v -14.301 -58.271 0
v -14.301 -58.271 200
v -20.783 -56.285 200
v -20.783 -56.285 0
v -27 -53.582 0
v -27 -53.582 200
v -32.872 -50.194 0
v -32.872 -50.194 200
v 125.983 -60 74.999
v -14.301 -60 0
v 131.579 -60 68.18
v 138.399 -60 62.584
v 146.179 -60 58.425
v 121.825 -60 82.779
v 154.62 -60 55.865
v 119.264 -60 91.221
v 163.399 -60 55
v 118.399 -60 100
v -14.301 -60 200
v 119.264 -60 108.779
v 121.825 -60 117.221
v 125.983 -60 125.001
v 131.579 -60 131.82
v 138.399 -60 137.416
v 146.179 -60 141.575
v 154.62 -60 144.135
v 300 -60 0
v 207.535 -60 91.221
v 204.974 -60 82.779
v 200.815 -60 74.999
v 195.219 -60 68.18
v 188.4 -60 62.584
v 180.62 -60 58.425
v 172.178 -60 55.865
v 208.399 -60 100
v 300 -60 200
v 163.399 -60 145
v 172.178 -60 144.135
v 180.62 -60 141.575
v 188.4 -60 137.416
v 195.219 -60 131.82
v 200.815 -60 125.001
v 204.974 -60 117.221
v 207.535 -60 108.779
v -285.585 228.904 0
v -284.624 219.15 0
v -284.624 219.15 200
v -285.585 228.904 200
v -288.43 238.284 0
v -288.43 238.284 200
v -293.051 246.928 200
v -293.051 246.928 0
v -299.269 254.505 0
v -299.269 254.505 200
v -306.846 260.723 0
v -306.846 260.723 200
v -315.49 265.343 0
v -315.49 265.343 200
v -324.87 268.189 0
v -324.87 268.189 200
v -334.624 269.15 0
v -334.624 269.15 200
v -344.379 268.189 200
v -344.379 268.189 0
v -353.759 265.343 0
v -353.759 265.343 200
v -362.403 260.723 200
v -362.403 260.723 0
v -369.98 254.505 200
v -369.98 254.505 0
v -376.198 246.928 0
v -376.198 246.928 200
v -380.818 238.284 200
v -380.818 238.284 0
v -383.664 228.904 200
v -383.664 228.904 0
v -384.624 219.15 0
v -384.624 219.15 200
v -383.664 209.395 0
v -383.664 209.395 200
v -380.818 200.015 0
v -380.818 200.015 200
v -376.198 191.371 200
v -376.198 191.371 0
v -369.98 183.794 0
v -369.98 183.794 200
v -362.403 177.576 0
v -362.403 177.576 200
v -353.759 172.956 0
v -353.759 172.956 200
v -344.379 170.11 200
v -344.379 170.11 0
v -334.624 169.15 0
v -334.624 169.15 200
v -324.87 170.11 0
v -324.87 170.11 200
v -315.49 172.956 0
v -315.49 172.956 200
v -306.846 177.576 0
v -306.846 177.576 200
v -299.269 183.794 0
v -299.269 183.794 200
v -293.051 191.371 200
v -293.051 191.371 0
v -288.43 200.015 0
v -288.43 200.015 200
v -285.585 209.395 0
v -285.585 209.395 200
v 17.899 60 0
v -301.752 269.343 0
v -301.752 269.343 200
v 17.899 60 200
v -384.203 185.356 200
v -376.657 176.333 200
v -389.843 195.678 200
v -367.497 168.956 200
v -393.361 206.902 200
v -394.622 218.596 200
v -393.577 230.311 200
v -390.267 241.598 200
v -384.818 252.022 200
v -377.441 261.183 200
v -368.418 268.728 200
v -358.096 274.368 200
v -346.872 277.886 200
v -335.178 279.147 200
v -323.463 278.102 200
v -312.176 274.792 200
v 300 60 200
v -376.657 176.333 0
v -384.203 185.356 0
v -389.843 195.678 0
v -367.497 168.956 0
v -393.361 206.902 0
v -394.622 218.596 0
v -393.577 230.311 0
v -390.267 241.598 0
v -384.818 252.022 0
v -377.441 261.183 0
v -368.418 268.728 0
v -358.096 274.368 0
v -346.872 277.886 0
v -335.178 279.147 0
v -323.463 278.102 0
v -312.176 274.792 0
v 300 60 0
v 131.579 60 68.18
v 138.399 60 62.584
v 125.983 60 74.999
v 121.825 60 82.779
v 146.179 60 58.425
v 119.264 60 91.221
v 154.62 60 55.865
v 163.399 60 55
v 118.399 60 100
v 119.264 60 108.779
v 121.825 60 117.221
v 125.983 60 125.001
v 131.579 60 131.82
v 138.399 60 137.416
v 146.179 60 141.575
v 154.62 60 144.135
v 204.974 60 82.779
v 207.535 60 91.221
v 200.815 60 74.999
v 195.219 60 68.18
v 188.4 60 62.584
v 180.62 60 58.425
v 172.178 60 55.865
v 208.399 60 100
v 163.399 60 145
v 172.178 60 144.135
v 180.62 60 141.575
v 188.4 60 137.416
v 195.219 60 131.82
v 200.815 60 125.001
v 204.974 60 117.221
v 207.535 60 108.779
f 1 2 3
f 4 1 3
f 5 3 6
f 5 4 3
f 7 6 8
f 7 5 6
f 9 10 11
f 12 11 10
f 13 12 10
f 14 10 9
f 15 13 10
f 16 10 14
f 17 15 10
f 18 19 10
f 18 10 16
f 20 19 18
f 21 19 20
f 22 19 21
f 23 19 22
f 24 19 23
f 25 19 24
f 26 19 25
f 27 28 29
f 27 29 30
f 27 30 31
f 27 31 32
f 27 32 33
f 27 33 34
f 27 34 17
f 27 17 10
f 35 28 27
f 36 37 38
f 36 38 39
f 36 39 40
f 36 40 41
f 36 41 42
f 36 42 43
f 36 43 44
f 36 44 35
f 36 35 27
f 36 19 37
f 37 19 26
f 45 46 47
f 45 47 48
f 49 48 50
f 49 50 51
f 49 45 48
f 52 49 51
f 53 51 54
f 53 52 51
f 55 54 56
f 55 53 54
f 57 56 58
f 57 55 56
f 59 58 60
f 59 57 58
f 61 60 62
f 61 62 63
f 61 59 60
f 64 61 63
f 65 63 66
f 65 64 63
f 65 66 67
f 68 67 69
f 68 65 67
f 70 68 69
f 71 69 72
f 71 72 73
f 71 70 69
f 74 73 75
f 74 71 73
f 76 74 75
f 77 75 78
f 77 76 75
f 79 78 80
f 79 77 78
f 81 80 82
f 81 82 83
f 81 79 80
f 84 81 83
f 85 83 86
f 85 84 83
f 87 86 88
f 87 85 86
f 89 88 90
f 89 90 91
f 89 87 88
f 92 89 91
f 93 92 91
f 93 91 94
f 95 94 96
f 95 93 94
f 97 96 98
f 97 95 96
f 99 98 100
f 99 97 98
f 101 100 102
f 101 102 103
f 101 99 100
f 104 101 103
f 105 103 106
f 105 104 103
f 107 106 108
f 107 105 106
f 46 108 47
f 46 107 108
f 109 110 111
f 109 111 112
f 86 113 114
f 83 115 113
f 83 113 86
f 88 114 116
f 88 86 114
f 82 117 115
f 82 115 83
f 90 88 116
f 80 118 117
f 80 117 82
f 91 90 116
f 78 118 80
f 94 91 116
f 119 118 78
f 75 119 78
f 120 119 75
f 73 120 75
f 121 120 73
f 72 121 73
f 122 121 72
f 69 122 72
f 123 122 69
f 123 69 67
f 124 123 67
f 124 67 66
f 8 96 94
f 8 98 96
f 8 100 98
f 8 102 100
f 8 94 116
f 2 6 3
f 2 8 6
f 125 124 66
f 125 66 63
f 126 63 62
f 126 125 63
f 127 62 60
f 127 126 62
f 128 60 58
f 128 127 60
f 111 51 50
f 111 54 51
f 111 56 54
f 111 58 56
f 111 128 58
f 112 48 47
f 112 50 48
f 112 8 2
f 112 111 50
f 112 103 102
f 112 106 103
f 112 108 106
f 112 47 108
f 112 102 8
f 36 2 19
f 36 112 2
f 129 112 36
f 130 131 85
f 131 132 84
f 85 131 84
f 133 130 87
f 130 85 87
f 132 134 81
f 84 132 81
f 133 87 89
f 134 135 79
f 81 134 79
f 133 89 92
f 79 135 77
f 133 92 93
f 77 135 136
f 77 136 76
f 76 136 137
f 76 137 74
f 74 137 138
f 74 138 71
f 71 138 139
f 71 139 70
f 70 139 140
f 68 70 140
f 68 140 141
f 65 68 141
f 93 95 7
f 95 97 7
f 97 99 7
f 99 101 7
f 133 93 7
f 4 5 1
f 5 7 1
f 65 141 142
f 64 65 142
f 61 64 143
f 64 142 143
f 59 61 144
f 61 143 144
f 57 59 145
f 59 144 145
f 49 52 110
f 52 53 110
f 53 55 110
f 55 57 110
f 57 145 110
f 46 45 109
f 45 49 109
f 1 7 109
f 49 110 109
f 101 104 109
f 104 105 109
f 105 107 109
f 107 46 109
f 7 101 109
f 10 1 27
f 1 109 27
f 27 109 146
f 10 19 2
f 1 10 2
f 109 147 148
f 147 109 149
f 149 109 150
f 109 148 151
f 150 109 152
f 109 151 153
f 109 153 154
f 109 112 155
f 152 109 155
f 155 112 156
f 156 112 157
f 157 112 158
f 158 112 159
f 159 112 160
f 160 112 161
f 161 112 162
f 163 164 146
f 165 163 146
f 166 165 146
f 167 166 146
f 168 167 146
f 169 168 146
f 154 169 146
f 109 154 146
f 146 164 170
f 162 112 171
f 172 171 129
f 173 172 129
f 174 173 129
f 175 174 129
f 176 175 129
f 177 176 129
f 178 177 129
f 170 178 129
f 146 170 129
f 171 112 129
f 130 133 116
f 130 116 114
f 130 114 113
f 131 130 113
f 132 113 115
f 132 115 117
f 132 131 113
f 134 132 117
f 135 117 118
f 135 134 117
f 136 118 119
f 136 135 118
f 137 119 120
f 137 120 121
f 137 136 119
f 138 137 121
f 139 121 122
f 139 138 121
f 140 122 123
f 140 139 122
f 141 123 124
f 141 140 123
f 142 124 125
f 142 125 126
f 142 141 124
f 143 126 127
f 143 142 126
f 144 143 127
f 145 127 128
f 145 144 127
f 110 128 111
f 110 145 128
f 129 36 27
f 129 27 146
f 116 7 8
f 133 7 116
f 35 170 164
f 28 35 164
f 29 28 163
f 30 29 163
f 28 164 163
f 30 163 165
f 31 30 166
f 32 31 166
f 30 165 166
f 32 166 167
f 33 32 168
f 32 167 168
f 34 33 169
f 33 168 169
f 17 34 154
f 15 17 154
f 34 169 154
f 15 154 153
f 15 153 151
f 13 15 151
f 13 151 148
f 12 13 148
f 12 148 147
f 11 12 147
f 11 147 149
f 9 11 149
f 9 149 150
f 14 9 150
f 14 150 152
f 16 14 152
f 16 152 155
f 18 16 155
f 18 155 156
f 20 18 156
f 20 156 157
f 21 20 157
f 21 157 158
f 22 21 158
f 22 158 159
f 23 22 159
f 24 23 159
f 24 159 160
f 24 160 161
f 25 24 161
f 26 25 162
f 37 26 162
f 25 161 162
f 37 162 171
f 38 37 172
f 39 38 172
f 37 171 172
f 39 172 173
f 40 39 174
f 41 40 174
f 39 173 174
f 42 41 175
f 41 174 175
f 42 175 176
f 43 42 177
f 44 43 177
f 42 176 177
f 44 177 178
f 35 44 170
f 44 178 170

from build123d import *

# Parameters (mm, degrees)
SKETCH2_R           = 50
BOSS_EXTRUDE1_DEPTH = 200
SKETCH4_W           = 314.300936027
SKETCH4_H           = 120
BOSS_EXTRUDE2_DEPTH = 200
SKETCH7_R           = 45
CUT_EXTRUDE1_DEPTH  = 121


with BuildPart() as part:
    # Sketch2 → Boss-Extrude1 (new body)
    with BuildSketch(Plane.XY):
        with BuildLine():
            Line((-32.872426913, -50.193660445), (-367.496829879, 168.955852308))
            ThreePointArc((-367.496829879, 168.955852308), (-384.818063411, 252.021939666), (-301.751976053, 269.343173198))
            Line((-301.751976053, 269.343173198), (32.872426913, 50.193660445))
            ThreePointArc((32.872426913, 50.193660445), (50.193660445, -32.872426913), (-32.872426913, -50.193660445))
        make_face()
        with Locations((-334.624402966, 219.149512753)):
            Circle(SKETCH2_R, mode=Mode.SUBTRACT)
    extrude(amount=BOSS_EXTRUDE1_DEPTH)

    # Sketch4 → Boss-Extrude2 (add)
    with BuildSketch(Plane.XY.offset(200)):
        with Locations((142.849531987, 0)):
            Rectangle(SKETCH4_W, SKETCH4_H)
    extrude(amount=-BOSS_EXTRUDE2_DEPTH)

    # Sketch7 → Cut-Extrude1 (cut, through all)
    with BuildSketch(Plane(origin=(0, 60, 0), x_dir=(1, 0, 0), z_dir=(0, 1, 0))):
        with Locations((163.399277188, -100)):
            Circle(SKETCH7_R)
    extrude(amount=-CUT_EXTRUDE1_DEPTH, mode=Mode.SUBTRACT)


solid = part.part
